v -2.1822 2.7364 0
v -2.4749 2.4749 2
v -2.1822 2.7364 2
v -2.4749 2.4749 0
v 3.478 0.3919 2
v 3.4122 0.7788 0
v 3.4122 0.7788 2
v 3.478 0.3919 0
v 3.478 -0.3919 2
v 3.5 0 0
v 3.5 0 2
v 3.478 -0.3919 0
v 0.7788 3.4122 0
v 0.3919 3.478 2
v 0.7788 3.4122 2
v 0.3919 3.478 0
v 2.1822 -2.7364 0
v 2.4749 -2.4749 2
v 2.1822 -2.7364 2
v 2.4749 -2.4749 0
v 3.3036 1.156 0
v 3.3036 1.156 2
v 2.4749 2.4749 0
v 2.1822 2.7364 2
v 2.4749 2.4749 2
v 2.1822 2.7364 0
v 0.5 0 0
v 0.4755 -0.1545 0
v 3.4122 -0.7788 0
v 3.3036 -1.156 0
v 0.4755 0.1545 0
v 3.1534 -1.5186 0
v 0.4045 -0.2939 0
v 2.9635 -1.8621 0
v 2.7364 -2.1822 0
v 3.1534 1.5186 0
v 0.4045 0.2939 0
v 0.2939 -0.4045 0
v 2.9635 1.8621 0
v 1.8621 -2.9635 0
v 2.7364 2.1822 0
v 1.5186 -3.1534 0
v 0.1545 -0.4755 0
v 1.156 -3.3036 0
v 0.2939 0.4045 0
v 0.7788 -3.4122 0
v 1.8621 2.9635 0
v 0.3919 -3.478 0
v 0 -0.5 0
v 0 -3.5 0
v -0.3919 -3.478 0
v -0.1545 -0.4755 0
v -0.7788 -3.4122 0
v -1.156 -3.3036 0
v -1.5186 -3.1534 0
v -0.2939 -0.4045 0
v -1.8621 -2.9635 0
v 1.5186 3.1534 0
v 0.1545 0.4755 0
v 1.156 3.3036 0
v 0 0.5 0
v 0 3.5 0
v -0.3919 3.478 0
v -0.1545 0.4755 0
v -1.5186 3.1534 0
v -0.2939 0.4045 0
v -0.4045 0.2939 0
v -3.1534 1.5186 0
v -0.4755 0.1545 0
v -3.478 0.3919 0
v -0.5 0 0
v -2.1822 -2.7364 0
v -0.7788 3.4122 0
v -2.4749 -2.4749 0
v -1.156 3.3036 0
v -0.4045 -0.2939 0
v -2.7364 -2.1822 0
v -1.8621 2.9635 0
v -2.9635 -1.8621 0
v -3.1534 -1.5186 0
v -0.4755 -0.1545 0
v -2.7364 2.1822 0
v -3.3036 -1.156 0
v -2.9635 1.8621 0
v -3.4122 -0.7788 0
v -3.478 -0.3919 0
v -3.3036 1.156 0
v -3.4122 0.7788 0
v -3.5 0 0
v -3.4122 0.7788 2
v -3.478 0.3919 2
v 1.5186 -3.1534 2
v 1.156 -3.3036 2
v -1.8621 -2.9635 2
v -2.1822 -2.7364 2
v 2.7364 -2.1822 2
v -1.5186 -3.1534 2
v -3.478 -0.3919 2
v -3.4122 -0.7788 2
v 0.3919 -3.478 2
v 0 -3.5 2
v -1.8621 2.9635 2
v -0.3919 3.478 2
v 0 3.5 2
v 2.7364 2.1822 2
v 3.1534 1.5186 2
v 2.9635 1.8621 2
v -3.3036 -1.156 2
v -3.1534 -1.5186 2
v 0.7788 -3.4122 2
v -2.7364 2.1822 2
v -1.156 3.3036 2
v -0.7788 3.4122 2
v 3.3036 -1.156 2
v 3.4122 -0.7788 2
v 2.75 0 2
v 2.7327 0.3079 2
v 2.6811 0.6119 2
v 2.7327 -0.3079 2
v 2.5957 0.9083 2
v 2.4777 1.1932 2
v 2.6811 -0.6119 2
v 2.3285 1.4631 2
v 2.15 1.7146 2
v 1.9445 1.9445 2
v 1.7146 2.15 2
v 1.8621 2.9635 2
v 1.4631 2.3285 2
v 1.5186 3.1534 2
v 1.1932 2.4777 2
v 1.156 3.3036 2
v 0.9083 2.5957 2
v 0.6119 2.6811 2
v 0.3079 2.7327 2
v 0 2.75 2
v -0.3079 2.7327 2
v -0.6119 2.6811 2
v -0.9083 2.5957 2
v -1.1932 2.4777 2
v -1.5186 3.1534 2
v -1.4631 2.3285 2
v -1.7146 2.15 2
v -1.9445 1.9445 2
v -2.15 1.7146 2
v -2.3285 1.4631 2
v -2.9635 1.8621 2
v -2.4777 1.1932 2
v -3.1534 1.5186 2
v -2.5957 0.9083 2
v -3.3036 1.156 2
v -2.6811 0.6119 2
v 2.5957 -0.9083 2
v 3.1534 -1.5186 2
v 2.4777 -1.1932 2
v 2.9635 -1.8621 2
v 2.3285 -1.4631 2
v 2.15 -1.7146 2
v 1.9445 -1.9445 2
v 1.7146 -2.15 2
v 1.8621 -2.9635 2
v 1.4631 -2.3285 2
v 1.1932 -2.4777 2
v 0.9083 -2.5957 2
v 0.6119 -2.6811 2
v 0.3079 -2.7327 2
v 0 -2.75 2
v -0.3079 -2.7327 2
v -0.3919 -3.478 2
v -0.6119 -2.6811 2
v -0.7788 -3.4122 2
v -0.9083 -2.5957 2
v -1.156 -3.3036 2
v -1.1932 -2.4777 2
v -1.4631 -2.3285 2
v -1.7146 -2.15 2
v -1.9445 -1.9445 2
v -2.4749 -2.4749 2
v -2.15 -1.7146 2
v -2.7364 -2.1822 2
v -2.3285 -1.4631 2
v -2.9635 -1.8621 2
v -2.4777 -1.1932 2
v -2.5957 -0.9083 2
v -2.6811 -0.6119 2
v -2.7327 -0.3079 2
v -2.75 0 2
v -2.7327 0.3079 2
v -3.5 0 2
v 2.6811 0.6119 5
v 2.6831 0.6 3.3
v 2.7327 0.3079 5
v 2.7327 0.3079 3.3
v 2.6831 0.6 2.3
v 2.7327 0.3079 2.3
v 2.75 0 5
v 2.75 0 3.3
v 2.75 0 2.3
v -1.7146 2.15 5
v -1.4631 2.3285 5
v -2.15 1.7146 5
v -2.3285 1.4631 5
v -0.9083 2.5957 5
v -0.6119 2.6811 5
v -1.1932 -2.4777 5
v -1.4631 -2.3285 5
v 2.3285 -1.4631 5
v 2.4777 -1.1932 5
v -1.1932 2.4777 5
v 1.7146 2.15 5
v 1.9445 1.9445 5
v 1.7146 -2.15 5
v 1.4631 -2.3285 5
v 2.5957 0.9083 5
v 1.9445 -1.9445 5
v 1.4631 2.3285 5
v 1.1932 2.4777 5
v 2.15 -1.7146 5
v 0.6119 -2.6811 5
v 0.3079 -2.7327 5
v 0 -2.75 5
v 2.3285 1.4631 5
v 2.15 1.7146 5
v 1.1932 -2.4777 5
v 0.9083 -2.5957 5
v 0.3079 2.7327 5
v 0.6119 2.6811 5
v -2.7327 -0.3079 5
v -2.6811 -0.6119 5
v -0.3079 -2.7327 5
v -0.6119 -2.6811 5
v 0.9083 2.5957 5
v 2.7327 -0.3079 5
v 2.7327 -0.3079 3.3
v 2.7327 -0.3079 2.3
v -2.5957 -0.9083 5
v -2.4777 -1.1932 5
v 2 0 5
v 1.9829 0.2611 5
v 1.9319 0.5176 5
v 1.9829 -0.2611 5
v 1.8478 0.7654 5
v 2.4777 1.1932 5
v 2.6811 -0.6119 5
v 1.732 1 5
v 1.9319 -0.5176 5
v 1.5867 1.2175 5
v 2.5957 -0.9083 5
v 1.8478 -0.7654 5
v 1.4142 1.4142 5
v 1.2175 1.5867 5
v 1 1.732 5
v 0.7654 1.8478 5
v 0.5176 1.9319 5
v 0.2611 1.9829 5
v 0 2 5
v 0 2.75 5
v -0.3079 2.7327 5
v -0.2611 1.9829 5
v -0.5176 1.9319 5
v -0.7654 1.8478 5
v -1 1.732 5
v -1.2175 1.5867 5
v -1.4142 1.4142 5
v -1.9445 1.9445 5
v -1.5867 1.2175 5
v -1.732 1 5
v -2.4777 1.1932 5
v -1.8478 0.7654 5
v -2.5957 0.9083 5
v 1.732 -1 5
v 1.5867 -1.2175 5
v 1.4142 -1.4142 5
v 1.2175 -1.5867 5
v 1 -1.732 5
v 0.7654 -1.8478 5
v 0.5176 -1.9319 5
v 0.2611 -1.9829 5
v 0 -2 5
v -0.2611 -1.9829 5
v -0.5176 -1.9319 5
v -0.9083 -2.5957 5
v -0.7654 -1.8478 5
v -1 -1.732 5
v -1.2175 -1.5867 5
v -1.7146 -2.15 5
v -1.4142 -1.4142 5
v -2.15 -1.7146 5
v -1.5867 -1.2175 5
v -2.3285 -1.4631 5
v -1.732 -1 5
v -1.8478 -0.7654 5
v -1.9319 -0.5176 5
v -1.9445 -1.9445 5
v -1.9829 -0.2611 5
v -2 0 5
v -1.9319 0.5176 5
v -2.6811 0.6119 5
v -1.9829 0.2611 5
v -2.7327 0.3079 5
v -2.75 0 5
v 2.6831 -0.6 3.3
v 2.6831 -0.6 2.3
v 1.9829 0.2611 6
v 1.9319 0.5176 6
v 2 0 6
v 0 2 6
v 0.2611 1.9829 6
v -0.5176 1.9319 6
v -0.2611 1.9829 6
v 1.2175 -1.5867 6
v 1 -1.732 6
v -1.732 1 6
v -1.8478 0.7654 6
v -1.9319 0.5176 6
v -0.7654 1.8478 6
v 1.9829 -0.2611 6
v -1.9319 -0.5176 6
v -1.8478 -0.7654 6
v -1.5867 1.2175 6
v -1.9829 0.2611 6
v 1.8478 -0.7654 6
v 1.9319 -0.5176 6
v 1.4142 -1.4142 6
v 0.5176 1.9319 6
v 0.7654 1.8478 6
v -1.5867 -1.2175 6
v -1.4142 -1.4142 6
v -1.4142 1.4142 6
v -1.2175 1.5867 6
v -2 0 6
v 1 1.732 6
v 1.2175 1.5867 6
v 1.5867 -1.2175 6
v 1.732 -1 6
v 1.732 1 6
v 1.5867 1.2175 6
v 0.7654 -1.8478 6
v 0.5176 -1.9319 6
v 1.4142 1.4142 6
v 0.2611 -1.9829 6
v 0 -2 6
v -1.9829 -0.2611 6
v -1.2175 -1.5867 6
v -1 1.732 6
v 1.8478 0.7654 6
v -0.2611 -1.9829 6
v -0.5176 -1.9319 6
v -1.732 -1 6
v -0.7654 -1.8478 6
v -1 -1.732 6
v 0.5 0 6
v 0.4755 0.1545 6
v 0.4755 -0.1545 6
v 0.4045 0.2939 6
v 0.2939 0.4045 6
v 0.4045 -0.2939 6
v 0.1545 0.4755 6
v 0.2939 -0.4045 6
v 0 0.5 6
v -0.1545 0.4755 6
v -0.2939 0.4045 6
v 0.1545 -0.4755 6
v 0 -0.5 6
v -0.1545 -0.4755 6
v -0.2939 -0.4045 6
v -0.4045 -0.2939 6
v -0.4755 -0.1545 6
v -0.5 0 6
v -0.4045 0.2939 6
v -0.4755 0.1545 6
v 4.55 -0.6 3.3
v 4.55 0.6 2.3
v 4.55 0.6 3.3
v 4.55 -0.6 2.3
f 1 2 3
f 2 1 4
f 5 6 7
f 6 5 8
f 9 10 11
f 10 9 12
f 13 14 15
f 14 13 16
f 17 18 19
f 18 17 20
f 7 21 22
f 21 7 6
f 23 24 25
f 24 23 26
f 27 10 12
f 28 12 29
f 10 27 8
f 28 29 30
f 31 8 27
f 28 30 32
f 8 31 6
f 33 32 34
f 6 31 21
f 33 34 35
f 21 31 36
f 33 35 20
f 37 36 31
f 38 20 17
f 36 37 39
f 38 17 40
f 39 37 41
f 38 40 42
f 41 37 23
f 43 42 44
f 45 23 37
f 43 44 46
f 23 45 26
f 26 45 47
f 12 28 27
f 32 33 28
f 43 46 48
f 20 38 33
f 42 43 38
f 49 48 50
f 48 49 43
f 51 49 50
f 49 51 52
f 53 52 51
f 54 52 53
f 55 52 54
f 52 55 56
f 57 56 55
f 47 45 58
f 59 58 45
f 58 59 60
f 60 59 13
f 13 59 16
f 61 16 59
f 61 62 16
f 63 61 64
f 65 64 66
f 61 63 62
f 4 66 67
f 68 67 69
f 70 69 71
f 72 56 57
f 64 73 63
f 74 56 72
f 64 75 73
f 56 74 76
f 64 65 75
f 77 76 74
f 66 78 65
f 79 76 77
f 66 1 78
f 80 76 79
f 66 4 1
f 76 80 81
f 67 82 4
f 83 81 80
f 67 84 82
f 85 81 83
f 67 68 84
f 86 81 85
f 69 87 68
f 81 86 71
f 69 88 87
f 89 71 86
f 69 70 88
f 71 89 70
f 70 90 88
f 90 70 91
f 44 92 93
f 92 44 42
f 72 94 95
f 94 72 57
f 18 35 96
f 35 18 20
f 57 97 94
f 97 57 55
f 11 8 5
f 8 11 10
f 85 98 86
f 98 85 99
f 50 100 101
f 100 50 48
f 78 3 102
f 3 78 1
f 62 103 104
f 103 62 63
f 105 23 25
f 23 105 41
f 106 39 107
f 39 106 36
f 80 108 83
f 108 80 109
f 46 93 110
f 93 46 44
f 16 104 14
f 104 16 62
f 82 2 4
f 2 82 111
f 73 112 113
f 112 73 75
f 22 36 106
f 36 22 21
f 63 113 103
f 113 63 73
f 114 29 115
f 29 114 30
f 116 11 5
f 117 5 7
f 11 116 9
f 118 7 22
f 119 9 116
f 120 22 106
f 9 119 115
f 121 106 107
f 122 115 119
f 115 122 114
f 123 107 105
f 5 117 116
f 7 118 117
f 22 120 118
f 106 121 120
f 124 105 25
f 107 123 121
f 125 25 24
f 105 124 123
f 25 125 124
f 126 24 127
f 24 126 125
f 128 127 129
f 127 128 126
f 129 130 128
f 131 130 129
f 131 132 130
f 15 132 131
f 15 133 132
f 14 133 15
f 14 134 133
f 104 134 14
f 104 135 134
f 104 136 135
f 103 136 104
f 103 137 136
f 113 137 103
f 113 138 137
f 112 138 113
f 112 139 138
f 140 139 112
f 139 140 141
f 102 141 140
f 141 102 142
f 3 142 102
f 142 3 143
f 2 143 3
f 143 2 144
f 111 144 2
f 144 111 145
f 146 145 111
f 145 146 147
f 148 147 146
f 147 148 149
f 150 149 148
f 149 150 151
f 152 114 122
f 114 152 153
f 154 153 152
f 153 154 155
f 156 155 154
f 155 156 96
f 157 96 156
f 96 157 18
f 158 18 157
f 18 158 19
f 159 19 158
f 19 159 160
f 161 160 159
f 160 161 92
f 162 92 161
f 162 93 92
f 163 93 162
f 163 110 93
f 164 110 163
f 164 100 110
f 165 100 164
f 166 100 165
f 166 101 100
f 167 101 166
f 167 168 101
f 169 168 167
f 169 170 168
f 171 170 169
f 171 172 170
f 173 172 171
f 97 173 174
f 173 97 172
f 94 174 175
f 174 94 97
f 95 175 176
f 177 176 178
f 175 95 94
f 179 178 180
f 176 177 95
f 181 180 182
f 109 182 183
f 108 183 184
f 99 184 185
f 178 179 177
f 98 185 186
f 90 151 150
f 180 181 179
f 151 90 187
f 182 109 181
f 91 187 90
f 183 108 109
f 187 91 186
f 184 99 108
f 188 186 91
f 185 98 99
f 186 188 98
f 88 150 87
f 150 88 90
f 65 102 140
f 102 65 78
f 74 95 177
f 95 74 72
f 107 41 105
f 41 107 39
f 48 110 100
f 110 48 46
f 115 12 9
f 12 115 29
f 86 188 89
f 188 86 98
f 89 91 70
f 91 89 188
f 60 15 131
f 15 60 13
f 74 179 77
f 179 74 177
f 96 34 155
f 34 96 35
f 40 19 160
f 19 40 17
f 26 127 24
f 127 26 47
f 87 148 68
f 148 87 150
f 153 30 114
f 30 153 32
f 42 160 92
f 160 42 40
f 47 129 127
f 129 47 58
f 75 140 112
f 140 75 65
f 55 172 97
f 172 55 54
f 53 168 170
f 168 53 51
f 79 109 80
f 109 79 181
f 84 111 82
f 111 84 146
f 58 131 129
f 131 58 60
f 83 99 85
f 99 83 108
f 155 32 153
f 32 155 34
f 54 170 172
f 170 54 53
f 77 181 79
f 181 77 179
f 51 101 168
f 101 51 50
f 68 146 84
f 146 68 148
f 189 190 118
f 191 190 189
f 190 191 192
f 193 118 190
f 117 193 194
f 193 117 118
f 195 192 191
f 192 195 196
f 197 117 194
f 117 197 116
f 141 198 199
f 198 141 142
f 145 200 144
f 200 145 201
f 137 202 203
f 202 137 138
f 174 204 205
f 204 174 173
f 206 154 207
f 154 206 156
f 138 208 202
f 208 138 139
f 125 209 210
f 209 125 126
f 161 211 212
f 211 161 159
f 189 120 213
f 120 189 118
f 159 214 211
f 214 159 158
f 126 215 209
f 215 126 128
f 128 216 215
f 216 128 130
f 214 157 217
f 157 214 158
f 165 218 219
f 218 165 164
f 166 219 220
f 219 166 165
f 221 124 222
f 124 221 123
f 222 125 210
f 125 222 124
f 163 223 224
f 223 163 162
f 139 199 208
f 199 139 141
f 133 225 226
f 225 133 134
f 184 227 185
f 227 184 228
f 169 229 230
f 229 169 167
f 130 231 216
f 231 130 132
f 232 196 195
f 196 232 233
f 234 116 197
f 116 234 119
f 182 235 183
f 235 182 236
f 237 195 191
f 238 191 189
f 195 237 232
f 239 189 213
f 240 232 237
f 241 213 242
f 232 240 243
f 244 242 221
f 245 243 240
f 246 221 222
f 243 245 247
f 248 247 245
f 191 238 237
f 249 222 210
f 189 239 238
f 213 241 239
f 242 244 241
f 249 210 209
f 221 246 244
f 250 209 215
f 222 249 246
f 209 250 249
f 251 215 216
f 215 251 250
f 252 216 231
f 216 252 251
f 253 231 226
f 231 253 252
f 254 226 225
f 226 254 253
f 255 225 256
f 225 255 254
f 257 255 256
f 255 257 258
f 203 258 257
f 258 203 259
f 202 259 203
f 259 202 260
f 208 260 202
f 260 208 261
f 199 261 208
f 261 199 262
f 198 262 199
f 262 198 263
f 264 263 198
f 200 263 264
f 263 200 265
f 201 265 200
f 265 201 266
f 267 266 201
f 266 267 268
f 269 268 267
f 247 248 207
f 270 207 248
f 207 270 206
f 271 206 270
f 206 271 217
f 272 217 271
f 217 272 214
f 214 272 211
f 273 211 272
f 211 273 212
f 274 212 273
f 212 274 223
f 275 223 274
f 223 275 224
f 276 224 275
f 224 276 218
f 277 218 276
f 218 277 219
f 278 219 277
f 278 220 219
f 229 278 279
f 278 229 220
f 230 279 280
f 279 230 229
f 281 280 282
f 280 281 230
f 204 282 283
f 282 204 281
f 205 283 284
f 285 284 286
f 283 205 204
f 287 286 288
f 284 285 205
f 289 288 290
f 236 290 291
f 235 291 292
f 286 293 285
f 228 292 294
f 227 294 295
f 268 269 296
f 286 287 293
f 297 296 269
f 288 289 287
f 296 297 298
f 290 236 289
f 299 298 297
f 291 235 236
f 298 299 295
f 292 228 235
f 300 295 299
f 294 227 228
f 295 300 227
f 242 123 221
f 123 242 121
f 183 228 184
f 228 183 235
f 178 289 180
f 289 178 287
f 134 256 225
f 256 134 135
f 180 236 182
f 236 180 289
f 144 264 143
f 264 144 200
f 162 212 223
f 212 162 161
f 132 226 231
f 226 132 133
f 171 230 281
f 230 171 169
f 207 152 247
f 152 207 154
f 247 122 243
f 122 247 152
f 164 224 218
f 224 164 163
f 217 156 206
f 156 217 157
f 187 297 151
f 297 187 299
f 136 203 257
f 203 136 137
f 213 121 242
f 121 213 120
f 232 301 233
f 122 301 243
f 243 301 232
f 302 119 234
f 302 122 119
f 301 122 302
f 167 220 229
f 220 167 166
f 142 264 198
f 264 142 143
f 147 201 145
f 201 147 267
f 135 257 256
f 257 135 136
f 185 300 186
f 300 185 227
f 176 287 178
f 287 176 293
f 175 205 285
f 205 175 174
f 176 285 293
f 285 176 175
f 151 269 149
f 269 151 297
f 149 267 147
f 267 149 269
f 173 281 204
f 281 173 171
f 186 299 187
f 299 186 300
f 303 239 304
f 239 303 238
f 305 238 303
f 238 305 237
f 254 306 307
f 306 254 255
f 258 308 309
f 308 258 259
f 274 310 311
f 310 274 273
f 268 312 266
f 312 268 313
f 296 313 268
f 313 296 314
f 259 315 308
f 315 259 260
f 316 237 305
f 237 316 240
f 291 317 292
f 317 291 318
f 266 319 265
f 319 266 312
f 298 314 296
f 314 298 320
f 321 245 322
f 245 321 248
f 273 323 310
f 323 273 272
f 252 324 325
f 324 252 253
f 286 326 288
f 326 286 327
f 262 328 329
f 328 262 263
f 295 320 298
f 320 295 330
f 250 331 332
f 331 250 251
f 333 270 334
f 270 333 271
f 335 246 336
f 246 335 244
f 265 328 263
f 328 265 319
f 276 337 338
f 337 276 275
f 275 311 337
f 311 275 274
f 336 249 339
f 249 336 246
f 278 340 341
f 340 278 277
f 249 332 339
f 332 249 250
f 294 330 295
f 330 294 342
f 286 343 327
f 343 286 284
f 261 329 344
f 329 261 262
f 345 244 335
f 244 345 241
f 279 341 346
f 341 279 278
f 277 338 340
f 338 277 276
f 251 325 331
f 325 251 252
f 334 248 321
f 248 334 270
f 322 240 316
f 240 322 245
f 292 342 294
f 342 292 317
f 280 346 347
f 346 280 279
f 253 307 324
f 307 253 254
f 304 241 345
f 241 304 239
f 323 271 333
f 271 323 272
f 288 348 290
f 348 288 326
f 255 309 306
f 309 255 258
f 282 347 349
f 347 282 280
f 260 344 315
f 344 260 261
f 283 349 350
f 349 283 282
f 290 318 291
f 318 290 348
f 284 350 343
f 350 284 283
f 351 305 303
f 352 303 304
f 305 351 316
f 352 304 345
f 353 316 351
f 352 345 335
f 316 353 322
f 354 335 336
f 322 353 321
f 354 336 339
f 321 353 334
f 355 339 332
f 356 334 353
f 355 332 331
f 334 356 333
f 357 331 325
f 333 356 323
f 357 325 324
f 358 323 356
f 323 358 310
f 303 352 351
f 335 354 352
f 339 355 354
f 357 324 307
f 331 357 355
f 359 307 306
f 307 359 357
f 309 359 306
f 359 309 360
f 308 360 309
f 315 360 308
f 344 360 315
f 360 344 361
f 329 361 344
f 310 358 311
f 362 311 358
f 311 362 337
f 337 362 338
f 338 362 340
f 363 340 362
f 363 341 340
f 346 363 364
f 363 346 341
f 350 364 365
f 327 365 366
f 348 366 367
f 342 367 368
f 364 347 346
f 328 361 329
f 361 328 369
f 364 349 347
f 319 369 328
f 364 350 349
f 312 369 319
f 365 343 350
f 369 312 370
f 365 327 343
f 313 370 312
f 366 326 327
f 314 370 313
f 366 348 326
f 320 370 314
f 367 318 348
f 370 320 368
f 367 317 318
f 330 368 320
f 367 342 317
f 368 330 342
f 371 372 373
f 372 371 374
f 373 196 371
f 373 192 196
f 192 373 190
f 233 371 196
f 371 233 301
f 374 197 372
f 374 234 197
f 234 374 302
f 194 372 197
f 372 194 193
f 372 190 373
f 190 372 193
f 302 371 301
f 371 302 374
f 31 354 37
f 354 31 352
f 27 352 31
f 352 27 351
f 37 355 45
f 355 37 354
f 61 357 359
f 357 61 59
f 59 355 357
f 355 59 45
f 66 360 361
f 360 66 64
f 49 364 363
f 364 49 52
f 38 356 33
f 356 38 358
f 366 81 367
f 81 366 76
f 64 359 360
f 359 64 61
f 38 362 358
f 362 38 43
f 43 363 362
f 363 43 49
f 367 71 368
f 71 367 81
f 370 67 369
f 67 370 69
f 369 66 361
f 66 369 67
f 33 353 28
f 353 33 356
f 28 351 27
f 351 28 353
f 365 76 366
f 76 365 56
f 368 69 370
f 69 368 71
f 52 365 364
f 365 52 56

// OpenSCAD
// part_id: mar6
// name: Mars press-fit hub
// source_drawing_ids: DRW-013
// units: mm
// revision: 0.1
// SPDX-License-Identifier: MIT

module part_mar6(
    flange_d = 7.0,
    body_d = 5.5,
    pin_d = 4.0,
    center_d = 1.0,
    total_h = 6.0,
    flange_h = 2.0,
    body_h = 3.0,
    pin_h = 1.0,
    ear_l = 2.0,
    ear_w = 1.2,
    ear_h = 1.0
) {
    difference() {
        union() {
            cylinder(d = flange_d, h = flange_h, center = false, $fn = 56);
            translate([0, 0, flange_h]) cylinder(d = body_d, h = body_h, center = false, $fn = 56);
            translate([0, 0, flange_h + body_h]) cylinder(d = pin_d, h = pin_h, center = false, $fn = 48);
            translate([body_d / 2 - 0.2, -ear_w / 2, flange_h + 0.3]) cube([ear_l, ear_w, ear_h], center = false);
        }
        translate([0, 0, -0.05]) cylinder(d = center_d, h = total_h + 0.1, center = false, $fn = 20);
    }
}

// ---- "main guard" ----
if (is_undef(__LIB_MODE__)) {
    part_mar6();
}
